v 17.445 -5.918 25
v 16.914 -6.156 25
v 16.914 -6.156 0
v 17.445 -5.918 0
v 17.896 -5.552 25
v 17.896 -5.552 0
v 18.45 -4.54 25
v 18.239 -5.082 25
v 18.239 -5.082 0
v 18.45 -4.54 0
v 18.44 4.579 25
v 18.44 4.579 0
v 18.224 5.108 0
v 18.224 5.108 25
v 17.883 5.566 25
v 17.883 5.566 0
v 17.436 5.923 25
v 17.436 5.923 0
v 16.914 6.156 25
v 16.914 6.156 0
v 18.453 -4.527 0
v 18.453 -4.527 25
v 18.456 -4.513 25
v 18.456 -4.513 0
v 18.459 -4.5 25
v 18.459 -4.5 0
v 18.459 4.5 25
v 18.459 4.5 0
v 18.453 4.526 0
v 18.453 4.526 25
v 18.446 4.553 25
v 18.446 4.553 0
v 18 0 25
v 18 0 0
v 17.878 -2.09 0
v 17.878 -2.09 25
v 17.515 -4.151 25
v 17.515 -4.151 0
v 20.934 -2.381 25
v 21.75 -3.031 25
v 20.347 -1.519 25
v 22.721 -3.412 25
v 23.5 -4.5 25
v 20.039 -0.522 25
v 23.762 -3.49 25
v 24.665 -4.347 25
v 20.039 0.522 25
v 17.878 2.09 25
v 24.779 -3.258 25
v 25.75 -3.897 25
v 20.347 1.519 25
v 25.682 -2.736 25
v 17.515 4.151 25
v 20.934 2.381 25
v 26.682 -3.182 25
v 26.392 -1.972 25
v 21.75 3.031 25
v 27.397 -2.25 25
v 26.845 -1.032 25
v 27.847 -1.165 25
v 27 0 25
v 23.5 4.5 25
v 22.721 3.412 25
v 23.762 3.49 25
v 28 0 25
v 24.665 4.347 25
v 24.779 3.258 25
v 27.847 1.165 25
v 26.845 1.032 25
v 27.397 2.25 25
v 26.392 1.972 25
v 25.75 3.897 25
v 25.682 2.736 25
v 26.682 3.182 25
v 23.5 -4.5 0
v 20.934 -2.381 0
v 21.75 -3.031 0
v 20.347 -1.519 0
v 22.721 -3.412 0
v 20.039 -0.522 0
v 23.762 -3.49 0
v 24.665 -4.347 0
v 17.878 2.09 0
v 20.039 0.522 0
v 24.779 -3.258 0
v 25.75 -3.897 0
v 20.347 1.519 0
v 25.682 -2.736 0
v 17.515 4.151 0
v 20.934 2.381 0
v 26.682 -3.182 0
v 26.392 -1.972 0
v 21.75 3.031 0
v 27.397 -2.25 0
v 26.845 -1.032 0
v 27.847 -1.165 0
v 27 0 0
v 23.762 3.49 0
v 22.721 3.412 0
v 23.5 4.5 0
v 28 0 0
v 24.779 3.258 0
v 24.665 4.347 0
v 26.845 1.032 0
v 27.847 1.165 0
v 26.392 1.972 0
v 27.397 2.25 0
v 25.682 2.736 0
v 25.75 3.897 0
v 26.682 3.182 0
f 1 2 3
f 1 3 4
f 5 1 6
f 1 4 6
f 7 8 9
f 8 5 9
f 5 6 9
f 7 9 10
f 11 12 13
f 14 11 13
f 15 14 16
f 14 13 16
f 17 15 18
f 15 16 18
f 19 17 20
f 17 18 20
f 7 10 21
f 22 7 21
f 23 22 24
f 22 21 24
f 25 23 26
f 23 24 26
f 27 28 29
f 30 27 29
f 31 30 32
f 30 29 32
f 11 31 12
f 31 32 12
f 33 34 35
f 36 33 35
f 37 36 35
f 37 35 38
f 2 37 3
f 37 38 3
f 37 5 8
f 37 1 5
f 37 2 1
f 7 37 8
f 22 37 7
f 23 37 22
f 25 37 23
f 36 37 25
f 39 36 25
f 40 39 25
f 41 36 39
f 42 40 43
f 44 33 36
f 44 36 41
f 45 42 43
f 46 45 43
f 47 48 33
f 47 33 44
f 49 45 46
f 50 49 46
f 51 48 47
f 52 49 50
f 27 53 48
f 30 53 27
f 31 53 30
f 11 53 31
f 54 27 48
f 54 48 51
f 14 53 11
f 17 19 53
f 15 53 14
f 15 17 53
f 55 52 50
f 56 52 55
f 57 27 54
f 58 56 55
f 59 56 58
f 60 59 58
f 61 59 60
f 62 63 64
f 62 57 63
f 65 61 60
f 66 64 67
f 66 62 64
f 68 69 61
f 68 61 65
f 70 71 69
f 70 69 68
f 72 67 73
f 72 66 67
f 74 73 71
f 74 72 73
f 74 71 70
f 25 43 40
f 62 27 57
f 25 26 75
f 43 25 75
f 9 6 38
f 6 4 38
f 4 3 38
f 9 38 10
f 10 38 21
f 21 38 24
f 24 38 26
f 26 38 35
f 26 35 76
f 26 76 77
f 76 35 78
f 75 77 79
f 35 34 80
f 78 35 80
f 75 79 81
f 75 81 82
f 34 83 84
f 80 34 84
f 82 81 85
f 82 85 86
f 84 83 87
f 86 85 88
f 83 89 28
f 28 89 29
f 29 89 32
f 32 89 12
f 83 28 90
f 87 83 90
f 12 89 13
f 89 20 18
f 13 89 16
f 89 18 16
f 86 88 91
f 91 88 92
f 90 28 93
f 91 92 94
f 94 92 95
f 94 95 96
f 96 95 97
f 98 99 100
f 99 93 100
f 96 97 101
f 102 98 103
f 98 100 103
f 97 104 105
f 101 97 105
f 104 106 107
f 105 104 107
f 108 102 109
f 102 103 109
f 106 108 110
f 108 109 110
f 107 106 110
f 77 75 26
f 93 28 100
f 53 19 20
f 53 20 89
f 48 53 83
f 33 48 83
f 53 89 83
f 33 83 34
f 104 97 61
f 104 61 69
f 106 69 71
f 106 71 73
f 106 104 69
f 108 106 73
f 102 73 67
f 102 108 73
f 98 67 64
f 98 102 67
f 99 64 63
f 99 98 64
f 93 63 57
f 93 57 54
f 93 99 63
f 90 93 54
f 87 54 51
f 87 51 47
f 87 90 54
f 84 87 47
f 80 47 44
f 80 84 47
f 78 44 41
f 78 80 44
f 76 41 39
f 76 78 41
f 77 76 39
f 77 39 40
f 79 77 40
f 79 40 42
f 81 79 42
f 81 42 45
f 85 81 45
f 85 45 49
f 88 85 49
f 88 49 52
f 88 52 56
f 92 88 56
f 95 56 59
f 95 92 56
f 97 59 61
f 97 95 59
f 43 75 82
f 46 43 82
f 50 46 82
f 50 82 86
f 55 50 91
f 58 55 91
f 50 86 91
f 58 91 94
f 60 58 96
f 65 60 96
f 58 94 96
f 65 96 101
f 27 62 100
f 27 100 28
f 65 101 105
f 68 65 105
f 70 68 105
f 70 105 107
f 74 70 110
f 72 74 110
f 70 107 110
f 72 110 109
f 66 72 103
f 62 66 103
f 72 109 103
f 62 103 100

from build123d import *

# Parameters (mm, degrees)
F0_R        = 3.5
F1_DEPTH    = 25
F2_T1_DEPTH = 35.23561564
F2_T3_DEPTH = 35.4401476299


# Not quite as in the source:
# - a fillet or chamfer that OpenCascade refuses, or shapes differently, is made with other operations: its cross-section is extruded or revolved along the edge and cut away or added


with BuildPart() as f1:
    # F0 (on Top) → F1 (new body)
    with BuildSketch(Plane.XY):
        with BuildLine():
            ThreePointArc((23.5, 4.5), (20.3180194847, 3.1819805153), (19, 0))
            ThreePointArc((19, 0), (20.3180194847, -3.1819805153), (23.5, -4.5))
            ThreePointArc((23.5, -4.5), (26.6819805153, -3.1819805153), (28, 0))
            ThreePointArc((28, 0), (26.6819805153, 3.1819805153), (23.5, 4.5))
        make_face()
        with Locations((23.5, 0)):
            Circle(F0_R, mode=Mode.SUBTRACT)
        with BuildLine():
            ThreePointArc((18.459414942, 4.5), (18.8643696409, 2.2661769682), (19, 0))
            ThreePointArc((19, 0), (20.3180194847, 3.1819805153), (23.5, 4.5))
            Line((23.5, 4.5), (18.459414942, 4.5))
        make_face()
        with BuildLine():
            ThreePointArc((23.5, -4.5), (20.3180194847, -3.1819805153), (19, 0))
            ThreePointArc((19, 0), (18.8643696409, -2.2661769682), (18.459414942, -4.5))
            Line((18.459414942, -4.5), (23.5, -4.5))
        make_face()
        with BuildLine():
            ThreePointArc((18.459414942, -4.5), (18.8643696409, -2.2661769682), (19, 0))
            ThreePointArc((19, 0), (18.8643696409, 2.2661769682), (18.459414942, 4.5))
            ThreePointArc((18.459414942, 4.5), (18.1842599773, 5.507512059), (17.8541597949, 6.4983827232))
            Line((17.8541597949, 6.4983827232), (16.9144671741, 6.1563625799))
            ThreePointArc((16.9144671741, 6.1563625799), (17.7265395542, 3.125667198), (18, 0))
            ThreePointArc((18, 0), (17.7265395542, -3.125667198), (16.9144671741, -6.1563625799))
            Line((16.9144671741, -6.1563625799), (17.8541597949, -6.4983827232))
            ThreePointArc((17.8541597949, -6.4983827232), (18.1842599773, -5.507512059), (18.459414942, -4.5))
        make_face()
    extrude(amount=F1_DEPTH)

    # F2: fillet of radius 2.25 on 2 edges, made by hand

    # F2_s2 → F2_t1 (cut)
    with BuildSketch(Plane.XY.offset(-5.11780782)):
        with BuildLine():
            ThreePointArc((16.9144671741, -6.1563625799), (17.8963613222, -5.5515835221), (18.4496693096, -4.5397910048))
            Line((18.4496693096, -4.5397910048), (18.4933658948, -4.5505431414))
            ThreePointArc((18.4933658948, -4.5505431414), (18.2213657624, -5.5402034939), (17.8964459629, -6.5137736296))
            Line((17.8964459629, -6.5137736296), (17.8387688885, -6.5406688911))
            ThreePointArc((17.8387688885, -6.5406688911), (17.3689225781, -6.3696588195), (16.9274597166, -6.1994461479))
            Line((16.9274597166, -6.1994461479), (16.9144671741, -6.1563625799))
        make_face()
    extrude(amount=F2_T1_DEPTH, mode=Mode.SUBTRACT)

    # F2_s4 → F2_t3 (cut)
    with BuildSketch(Plane.XY.offset(-5.2200738149)):
        with BuildLine():
            ThreePointArc((18.459414942, 4.5), (17.9105670548, 5.5367651403), (16.9144671741, 6.1563625799))
            Line((16.9144671741, 6.1563625799), (16.9274524792, 6.1994483299))
            ThreePointArc((16.9274524792, 6.1994483299), (17.3689225781, 6.3696588195), (17.8387688885, 6.5406688911))
            Line((17.8387688885, 6.5406688911), (17.8964459629, 6.5137736296))
            ThreePointArc((17.8964459629, 6.5137736296), (18.2273279614, 5.5205561665), (18.5032992024, 4.5099584984))
            Line((18.5032992024, 4.5099584984), (18.459414942, 4.5))
        make_face()
    extrude(amount=F2_T3_DEPTH, mode=Mode.SUBTRACT)


solid = f1.part
